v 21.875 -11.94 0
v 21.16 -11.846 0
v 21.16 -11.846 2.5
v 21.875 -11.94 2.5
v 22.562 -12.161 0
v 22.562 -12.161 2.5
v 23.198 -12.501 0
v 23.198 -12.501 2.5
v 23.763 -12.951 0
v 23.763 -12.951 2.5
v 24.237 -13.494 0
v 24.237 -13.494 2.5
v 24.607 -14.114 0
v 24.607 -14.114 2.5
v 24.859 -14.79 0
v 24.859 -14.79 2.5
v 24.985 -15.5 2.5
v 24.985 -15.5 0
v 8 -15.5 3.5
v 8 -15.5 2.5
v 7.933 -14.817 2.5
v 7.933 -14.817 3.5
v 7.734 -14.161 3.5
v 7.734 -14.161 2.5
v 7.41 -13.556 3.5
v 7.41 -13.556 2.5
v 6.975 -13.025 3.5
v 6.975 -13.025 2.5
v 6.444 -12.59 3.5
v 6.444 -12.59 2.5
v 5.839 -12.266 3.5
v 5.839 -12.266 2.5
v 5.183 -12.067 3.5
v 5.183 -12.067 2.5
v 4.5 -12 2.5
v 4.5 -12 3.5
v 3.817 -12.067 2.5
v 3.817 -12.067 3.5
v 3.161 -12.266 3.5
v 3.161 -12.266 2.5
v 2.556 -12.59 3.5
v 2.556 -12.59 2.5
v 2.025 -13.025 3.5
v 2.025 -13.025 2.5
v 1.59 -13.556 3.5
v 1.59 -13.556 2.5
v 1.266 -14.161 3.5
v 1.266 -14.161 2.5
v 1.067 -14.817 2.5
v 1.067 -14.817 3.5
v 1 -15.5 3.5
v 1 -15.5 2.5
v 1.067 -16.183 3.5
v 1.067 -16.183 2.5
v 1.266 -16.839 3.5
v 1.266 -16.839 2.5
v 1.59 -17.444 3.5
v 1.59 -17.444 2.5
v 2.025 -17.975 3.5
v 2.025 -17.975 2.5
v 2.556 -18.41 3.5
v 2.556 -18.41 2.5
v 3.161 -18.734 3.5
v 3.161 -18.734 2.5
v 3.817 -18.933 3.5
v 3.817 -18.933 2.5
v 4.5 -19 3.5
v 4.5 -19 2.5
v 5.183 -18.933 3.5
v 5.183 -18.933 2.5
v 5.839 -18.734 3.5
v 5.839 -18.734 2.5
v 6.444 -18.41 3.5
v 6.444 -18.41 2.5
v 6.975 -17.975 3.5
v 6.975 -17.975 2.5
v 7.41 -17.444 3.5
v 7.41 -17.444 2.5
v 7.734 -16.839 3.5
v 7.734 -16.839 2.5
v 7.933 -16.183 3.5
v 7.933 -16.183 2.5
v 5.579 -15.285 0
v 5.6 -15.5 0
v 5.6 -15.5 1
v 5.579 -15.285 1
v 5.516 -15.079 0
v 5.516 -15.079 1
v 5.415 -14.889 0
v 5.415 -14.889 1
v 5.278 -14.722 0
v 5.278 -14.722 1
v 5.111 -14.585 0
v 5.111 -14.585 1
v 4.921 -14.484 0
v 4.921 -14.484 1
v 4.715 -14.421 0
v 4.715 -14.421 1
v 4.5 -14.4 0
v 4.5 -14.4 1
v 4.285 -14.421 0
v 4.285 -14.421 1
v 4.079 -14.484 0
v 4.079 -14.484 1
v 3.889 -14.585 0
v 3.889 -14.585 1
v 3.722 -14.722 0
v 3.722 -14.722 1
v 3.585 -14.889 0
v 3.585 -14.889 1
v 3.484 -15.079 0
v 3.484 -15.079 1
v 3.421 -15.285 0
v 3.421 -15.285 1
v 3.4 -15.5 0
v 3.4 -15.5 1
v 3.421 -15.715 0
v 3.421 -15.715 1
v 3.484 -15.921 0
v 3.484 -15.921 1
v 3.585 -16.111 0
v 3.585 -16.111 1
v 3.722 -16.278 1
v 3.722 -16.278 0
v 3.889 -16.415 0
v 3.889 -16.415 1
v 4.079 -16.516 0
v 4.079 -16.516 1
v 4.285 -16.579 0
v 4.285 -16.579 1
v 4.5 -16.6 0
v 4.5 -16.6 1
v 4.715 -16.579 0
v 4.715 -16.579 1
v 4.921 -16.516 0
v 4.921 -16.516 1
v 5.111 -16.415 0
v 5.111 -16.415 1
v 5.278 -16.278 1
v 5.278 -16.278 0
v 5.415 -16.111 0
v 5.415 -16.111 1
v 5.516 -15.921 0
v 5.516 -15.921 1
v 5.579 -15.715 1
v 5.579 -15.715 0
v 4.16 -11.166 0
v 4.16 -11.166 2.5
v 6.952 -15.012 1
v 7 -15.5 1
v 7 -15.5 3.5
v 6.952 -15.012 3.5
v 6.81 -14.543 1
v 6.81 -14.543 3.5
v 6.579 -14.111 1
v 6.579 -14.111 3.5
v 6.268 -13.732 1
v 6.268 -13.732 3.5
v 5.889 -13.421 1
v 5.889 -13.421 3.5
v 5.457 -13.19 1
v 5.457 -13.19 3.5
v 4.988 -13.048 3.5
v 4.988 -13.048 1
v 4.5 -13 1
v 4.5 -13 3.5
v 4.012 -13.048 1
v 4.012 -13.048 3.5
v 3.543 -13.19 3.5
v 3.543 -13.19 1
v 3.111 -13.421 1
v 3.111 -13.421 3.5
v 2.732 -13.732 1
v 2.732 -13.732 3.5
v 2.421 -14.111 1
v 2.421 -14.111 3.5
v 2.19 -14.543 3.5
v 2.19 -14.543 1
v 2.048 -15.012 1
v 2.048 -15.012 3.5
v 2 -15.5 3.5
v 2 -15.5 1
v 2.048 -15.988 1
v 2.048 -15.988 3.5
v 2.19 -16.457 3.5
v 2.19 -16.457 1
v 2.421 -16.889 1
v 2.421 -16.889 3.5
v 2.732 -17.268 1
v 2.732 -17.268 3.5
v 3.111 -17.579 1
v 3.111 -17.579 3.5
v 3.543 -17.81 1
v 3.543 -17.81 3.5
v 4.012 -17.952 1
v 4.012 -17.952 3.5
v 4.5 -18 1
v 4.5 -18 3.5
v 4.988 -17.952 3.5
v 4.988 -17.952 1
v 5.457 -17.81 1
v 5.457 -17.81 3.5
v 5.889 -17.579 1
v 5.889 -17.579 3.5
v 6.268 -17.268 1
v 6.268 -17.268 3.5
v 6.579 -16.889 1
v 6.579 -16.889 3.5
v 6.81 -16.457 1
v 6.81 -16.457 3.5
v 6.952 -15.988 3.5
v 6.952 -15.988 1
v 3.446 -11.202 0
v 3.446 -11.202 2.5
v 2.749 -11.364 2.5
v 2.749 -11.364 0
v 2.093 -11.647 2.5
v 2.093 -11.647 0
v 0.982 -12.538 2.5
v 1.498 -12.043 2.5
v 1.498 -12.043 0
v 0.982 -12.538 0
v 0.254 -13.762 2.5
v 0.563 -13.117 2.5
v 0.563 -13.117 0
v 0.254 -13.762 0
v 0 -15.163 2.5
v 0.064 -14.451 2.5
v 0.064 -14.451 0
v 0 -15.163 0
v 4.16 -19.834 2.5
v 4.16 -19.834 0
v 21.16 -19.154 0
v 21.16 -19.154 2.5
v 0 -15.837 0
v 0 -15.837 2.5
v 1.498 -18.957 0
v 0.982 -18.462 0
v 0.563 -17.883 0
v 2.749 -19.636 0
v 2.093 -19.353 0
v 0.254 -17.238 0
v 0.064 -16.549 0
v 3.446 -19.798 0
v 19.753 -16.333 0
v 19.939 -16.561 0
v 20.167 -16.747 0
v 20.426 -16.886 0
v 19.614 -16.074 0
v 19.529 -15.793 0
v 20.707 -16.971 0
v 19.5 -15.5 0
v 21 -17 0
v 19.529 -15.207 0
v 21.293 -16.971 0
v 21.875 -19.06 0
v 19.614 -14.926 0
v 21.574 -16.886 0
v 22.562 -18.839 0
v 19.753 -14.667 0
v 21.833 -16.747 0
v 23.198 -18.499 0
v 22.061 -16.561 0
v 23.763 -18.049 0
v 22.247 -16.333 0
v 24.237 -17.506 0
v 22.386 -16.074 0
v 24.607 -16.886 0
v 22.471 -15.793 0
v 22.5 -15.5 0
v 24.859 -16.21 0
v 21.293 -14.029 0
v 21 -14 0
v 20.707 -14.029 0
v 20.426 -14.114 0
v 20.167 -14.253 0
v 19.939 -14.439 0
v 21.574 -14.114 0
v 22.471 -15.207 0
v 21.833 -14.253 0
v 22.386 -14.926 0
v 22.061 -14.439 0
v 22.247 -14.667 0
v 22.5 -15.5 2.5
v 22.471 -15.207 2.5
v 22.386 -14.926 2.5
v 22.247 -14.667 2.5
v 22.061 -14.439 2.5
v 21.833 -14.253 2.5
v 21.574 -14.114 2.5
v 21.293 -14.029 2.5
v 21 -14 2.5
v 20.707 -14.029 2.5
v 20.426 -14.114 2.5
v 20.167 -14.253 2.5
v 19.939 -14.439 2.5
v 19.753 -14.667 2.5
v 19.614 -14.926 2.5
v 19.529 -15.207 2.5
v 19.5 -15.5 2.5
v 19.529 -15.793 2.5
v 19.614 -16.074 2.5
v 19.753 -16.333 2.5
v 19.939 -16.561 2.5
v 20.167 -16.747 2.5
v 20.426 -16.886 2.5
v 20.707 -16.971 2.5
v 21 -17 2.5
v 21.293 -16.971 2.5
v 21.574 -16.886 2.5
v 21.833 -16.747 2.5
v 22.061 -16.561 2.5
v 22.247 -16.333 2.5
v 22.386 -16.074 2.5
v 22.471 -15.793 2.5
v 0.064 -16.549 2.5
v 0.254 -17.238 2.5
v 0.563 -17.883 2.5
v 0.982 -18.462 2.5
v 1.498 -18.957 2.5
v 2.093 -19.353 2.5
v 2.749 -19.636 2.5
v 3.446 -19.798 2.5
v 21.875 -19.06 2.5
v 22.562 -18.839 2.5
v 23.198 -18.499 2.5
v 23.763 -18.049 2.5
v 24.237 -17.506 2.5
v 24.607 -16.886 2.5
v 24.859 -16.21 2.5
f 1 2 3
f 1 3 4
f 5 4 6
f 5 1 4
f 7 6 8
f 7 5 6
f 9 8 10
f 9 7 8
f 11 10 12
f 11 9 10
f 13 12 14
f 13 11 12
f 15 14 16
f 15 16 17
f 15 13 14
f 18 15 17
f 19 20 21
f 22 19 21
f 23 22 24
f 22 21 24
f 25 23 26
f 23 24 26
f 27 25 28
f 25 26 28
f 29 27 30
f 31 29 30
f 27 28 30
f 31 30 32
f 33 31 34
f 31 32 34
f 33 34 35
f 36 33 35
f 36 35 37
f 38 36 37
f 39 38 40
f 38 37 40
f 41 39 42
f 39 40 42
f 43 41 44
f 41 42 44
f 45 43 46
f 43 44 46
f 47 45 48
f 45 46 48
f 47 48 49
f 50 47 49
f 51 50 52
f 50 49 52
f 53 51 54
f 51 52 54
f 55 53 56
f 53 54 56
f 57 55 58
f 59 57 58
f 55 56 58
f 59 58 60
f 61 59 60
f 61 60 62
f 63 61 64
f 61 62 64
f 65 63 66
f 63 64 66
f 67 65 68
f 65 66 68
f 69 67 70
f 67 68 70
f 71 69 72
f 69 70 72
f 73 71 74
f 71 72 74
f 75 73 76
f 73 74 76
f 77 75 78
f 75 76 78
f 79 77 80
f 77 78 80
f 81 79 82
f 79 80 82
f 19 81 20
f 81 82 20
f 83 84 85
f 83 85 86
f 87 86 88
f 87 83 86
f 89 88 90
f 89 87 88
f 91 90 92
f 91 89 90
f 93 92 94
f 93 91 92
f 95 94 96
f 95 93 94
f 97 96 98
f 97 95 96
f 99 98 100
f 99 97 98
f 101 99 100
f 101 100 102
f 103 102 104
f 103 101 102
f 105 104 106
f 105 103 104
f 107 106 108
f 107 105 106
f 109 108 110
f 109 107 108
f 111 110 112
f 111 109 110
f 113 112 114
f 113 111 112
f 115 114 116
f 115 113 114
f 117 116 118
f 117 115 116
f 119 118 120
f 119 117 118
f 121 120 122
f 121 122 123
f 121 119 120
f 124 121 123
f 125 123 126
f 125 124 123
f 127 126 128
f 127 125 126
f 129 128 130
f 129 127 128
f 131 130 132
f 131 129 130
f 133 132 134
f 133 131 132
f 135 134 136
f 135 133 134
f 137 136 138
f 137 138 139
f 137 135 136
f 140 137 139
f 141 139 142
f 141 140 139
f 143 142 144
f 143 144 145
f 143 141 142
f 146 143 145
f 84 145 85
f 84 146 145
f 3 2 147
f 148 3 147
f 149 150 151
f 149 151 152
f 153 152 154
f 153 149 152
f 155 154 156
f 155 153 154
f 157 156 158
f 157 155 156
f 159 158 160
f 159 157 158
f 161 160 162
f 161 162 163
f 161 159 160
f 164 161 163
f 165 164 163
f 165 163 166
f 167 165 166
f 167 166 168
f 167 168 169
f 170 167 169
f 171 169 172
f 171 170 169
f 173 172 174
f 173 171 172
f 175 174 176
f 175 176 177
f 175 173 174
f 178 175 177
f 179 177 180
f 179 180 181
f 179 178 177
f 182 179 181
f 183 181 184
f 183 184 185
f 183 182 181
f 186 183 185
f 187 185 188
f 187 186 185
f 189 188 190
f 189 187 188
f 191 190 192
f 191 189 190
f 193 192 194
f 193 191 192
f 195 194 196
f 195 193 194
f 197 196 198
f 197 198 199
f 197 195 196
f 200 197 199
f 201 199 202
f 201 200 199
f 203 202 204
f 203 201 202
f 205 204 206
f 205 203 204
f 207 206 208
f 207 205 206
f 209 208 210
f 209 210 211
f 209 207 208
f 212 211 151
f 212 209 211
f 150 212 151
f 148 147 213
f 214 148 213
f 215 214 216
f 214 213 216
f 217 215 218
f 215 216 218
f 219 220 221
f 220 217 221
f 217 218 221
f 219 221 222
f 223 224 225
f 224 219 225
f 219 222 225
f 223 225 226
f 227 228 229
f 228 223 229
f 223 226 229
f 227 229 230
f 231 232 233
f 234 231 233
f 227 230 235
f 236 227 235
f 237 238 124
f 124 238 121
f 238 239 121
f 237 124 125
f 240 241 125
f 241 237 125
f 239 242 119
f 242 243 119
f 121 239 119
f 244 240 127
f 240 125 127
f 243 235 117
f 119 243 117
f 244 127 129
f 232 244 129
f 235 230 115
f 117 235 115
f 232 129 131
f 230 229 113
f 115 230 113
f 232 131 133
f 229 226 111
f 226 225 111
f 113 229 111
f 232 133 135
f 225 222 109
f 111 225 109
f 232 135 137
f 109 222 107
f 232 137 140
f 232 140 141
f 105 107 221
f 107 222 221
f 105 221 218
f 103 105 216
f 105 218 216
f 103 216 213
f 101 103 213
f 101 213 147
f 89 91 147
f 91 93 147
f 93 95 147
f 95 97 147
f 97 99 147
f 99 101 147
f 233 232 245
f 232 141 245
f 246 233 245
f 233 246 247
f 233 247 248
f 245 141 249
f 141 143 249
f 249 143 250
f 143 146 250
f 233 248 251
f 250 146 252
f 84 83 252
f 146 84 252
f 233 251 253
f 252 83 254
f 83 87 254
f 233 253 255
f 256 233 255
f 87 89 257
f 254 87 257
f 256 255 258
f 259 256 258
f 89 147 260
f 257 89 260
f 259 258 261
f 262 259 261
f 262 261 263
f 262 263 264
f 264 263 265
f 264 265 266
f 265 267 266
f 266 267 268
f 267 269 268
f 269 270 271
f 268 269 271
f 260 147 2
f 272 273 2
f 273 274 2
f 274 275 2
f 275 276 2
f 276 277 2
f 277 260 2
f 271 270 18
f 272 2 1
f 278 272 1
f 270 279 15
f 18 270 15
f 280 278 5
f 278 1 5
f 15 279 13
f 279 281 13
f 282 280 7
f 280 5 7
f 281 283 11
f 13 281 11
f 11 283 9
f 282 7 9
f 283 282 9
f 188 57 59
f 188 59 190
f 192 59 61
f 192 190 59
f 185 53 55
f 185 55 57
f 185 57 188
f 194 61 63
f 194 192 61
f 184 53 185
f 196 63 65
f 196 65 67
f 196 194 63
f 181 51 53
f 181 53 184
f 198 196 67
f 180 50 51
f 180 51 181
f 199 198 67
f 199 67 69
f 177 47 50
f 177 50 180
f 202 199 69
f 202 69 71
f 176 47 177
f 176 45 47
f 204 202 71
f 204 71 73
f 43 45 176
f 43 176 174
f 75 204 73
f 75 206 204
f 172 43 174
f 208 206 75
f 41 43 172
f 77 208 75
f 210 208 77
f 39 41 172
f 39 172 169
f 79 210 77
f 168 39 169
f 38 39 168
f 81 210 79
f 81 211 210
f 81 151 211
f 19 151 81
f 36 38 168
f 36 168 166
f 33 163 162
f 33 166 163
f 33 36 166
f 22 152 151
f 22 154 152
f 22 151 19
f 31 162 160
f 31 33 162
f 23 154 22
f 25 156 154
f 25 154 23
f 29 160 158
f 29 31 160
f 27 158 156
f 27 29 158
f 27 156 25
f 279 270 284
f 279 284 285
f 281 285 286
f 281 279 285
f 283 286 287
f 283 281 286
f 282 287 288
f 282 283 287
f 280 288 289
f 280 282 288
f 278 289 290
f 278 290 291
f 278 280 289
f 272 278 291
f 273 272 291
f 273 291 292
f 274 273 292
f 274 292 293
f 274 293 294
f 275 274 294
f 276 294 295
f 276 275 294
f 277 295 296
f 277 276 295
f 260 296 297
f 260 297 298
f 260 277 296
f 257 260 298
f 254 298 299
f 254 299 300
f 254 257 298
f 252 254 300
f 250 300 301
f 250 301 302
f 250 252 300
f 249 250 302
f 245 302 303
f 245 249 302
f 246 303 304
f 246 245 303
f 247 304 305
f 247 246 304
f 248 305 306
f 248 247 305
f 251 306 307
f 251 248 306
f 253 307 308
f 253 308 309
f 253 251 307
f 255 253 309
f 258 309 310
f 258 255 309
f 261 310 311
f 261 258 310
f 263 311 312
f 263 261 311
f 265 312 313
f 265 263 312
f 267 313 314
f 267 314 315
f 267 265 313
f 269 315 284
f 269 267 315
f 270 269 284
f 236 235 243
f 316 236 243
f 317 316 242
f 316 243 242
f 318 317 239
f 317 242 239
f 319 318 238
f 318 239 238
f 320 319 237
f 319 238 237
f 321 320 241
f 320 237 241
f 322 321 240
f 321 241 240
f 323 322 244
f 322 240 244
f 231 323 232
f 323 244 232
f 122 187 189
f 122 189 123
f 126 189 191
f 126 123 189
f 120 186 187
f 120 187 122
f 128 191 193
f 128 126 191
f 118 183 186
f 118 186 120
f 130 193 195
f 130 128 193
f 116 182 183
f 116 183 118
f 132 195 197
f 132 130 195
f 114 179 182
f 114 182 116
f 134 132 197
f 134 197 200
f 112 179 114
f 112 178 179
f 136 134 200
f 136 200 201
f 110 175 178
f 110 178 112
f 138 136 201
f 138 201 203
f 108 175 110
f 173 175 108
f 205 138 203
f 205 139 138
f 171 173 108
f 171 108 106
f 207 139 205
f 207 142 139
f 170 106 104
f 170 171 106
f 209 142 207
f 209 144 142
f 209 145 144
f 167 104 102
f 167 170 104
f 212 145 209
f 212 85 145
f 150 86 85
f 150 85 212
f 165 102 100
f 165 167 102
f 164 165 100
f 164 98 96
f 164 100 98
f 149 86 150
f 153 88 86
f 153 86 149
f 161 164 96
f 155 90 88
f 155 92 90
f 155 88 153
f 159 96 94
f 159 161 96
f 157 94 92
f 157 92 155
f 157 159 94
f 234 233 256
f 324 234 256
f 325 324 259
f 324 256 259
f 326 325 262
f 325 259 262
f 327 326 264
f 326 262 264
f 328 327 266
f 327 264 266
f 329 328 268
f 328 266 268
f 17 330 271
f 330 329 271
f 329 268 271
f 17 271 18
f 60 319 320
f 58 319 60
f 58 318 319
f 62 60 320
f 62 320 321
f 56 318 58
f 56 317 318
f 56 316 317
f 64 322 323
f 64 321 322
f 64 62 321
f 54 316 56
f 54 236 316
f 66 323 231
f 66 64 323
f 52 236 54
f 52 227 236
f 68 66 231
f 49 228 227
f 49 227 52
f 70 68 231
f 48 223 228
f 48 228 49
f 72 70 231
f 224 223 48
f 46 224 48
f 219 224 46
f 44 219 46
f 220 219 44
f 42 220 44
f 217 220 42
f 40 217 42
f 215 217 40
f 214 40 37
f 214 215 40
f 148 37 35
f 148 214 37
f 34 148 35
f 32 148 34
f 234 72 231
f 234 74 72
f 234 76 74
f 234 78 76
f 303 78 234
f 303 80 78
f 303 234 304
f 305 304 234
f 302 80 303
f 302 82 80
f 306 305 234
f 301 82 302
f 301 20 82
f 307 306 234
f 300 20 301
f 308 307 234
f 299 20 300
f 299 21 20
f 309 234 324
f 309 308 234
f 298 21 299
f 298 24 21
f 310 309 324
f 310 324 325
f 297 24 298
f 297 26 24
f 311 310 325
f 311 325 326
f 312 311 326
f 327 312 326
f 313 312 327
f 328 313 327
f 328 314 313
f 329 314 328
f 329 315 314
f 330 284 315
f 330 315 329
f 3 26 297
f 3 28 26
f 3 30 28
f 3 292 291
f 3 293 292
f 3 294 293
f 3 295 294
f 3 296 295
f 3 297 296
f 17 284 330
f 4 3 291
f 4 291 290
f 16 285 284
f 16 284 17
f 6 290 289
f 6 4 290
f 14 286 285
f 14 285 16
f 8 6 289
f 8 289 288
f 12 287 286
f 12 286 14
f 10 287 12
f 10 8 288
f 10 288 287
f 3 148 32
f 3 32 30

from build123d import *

# Parameters (mm, degrees)
F0_R        = 2.5
F0_R_2      = 1.5
F1_DEPTH    = 2.5
F2_T1_DEPTH = 21.7159936051
F2_T3_DEPTH = 23.3159936051
F3_R        = 3.5
F3_R_2      = 2.5
F4_DEPTH    = 1
F5_R        = 2.5
F5_R_2      = 1.1
F6_DEPTH    = 1


# Not quite as in the source:
# - a fillet or chamfer that OpenCascade refuses, or shapes differently, is made with other operations: its cross-section is extruded or revolved along the edge and cut away or added


with BuildPart() as f1:
    # F0 (on Top) → F1 (new body)
    with BuildSketch(Plane.XY):
        Polygon((25, -12), (0, -11), (0, -20), (25, -19), align=None)
        with Locations((4.5, -15.5)):
            Circle(F0_R, mode=Mode.SUBTRACT)
        with Locations((21, -15.5)):
            Circle(F0_R_2, mode=Mode.SUBTRACT)
    extrude(amount=F1_DEPTH)

    # F2: fillet of radius 4 on 4 edges, made by hand

    # F2_s2 → F2_t1 (cut)
    with BuildSketch(Plane.XY.offset(-9.6079968026)):
        with BuildLine():
            ThreePointArc((21.1598721534, -11.8463948861), (23.8843966972, -13.0718712966), (25, -15.843198721))
            Line((25, -15.843198721), (25, -12))
            Line((25, -12), (21.1598721534, -11.8463948861))
        make_face()
        with BuildLine():
            ThreePointArc((21.1598721534, -19.1536051139), (23.8843966972, -17.9281287034), (25, -15.156801279))
            Line((25, -15.156801279), (25, -19))
            Line((25, -19), (21.1598721534, -19.1536051139))
        make_face()
    extrude(amount=F2_T1_DEPTH, mode=Mode.SUBTRACT)

    # F2_s4 → F2_t3 (cut)
    with BuildSketch(Plane.XY.offset(-10.4079968026)):
        with BuildLine():
            ThreePointArc((4.1598721534, -11.1663948861), (1.2286725756, -12.2788020238), (0, -15.163198721))
            Line((0, -15.163198721), (0, -11))
            Line((0, -11), (4.1598721534, -11.1663948861))
        make_face()
        with BuildLine():
            ThreePointArc((0, -15.836801279), (1.2286725756, -18.7211979762), (4.1598721534, -19.8336051139))
            Line((4.1598721534, -19.8336051139), (0, -20))
            Line((0, -20), (0, -15.836801279))
        make_face()
    extrude(amount=F2_T3_DEPTH, mode=Mode.SUBTRACT)

    # F3 (on face) → F4 (join)
    with BuildSketch(Plane.XY.offset(2.5)):
        with Locations((4.5, -15.5)):
            Circle(F3_R)
        with Locations((4.5, -15.5)):
            Circle(F3_R_2, mode=Mode.SUBTRACT)
    extrude(amount=F4_DEPTH)

    # F5 (on Top) → F6 (join)
    with BuildSketch(Plane.XY):
        with Locations((4.5, -15.5)):
            Circle(F5_R)
        with Locations((4.5, -15.5)):
            Circle(F5_R_2, mode=Mode.SUBTRACT)
    extrude(amount=F6_DEPTH)


solid = f1.part
